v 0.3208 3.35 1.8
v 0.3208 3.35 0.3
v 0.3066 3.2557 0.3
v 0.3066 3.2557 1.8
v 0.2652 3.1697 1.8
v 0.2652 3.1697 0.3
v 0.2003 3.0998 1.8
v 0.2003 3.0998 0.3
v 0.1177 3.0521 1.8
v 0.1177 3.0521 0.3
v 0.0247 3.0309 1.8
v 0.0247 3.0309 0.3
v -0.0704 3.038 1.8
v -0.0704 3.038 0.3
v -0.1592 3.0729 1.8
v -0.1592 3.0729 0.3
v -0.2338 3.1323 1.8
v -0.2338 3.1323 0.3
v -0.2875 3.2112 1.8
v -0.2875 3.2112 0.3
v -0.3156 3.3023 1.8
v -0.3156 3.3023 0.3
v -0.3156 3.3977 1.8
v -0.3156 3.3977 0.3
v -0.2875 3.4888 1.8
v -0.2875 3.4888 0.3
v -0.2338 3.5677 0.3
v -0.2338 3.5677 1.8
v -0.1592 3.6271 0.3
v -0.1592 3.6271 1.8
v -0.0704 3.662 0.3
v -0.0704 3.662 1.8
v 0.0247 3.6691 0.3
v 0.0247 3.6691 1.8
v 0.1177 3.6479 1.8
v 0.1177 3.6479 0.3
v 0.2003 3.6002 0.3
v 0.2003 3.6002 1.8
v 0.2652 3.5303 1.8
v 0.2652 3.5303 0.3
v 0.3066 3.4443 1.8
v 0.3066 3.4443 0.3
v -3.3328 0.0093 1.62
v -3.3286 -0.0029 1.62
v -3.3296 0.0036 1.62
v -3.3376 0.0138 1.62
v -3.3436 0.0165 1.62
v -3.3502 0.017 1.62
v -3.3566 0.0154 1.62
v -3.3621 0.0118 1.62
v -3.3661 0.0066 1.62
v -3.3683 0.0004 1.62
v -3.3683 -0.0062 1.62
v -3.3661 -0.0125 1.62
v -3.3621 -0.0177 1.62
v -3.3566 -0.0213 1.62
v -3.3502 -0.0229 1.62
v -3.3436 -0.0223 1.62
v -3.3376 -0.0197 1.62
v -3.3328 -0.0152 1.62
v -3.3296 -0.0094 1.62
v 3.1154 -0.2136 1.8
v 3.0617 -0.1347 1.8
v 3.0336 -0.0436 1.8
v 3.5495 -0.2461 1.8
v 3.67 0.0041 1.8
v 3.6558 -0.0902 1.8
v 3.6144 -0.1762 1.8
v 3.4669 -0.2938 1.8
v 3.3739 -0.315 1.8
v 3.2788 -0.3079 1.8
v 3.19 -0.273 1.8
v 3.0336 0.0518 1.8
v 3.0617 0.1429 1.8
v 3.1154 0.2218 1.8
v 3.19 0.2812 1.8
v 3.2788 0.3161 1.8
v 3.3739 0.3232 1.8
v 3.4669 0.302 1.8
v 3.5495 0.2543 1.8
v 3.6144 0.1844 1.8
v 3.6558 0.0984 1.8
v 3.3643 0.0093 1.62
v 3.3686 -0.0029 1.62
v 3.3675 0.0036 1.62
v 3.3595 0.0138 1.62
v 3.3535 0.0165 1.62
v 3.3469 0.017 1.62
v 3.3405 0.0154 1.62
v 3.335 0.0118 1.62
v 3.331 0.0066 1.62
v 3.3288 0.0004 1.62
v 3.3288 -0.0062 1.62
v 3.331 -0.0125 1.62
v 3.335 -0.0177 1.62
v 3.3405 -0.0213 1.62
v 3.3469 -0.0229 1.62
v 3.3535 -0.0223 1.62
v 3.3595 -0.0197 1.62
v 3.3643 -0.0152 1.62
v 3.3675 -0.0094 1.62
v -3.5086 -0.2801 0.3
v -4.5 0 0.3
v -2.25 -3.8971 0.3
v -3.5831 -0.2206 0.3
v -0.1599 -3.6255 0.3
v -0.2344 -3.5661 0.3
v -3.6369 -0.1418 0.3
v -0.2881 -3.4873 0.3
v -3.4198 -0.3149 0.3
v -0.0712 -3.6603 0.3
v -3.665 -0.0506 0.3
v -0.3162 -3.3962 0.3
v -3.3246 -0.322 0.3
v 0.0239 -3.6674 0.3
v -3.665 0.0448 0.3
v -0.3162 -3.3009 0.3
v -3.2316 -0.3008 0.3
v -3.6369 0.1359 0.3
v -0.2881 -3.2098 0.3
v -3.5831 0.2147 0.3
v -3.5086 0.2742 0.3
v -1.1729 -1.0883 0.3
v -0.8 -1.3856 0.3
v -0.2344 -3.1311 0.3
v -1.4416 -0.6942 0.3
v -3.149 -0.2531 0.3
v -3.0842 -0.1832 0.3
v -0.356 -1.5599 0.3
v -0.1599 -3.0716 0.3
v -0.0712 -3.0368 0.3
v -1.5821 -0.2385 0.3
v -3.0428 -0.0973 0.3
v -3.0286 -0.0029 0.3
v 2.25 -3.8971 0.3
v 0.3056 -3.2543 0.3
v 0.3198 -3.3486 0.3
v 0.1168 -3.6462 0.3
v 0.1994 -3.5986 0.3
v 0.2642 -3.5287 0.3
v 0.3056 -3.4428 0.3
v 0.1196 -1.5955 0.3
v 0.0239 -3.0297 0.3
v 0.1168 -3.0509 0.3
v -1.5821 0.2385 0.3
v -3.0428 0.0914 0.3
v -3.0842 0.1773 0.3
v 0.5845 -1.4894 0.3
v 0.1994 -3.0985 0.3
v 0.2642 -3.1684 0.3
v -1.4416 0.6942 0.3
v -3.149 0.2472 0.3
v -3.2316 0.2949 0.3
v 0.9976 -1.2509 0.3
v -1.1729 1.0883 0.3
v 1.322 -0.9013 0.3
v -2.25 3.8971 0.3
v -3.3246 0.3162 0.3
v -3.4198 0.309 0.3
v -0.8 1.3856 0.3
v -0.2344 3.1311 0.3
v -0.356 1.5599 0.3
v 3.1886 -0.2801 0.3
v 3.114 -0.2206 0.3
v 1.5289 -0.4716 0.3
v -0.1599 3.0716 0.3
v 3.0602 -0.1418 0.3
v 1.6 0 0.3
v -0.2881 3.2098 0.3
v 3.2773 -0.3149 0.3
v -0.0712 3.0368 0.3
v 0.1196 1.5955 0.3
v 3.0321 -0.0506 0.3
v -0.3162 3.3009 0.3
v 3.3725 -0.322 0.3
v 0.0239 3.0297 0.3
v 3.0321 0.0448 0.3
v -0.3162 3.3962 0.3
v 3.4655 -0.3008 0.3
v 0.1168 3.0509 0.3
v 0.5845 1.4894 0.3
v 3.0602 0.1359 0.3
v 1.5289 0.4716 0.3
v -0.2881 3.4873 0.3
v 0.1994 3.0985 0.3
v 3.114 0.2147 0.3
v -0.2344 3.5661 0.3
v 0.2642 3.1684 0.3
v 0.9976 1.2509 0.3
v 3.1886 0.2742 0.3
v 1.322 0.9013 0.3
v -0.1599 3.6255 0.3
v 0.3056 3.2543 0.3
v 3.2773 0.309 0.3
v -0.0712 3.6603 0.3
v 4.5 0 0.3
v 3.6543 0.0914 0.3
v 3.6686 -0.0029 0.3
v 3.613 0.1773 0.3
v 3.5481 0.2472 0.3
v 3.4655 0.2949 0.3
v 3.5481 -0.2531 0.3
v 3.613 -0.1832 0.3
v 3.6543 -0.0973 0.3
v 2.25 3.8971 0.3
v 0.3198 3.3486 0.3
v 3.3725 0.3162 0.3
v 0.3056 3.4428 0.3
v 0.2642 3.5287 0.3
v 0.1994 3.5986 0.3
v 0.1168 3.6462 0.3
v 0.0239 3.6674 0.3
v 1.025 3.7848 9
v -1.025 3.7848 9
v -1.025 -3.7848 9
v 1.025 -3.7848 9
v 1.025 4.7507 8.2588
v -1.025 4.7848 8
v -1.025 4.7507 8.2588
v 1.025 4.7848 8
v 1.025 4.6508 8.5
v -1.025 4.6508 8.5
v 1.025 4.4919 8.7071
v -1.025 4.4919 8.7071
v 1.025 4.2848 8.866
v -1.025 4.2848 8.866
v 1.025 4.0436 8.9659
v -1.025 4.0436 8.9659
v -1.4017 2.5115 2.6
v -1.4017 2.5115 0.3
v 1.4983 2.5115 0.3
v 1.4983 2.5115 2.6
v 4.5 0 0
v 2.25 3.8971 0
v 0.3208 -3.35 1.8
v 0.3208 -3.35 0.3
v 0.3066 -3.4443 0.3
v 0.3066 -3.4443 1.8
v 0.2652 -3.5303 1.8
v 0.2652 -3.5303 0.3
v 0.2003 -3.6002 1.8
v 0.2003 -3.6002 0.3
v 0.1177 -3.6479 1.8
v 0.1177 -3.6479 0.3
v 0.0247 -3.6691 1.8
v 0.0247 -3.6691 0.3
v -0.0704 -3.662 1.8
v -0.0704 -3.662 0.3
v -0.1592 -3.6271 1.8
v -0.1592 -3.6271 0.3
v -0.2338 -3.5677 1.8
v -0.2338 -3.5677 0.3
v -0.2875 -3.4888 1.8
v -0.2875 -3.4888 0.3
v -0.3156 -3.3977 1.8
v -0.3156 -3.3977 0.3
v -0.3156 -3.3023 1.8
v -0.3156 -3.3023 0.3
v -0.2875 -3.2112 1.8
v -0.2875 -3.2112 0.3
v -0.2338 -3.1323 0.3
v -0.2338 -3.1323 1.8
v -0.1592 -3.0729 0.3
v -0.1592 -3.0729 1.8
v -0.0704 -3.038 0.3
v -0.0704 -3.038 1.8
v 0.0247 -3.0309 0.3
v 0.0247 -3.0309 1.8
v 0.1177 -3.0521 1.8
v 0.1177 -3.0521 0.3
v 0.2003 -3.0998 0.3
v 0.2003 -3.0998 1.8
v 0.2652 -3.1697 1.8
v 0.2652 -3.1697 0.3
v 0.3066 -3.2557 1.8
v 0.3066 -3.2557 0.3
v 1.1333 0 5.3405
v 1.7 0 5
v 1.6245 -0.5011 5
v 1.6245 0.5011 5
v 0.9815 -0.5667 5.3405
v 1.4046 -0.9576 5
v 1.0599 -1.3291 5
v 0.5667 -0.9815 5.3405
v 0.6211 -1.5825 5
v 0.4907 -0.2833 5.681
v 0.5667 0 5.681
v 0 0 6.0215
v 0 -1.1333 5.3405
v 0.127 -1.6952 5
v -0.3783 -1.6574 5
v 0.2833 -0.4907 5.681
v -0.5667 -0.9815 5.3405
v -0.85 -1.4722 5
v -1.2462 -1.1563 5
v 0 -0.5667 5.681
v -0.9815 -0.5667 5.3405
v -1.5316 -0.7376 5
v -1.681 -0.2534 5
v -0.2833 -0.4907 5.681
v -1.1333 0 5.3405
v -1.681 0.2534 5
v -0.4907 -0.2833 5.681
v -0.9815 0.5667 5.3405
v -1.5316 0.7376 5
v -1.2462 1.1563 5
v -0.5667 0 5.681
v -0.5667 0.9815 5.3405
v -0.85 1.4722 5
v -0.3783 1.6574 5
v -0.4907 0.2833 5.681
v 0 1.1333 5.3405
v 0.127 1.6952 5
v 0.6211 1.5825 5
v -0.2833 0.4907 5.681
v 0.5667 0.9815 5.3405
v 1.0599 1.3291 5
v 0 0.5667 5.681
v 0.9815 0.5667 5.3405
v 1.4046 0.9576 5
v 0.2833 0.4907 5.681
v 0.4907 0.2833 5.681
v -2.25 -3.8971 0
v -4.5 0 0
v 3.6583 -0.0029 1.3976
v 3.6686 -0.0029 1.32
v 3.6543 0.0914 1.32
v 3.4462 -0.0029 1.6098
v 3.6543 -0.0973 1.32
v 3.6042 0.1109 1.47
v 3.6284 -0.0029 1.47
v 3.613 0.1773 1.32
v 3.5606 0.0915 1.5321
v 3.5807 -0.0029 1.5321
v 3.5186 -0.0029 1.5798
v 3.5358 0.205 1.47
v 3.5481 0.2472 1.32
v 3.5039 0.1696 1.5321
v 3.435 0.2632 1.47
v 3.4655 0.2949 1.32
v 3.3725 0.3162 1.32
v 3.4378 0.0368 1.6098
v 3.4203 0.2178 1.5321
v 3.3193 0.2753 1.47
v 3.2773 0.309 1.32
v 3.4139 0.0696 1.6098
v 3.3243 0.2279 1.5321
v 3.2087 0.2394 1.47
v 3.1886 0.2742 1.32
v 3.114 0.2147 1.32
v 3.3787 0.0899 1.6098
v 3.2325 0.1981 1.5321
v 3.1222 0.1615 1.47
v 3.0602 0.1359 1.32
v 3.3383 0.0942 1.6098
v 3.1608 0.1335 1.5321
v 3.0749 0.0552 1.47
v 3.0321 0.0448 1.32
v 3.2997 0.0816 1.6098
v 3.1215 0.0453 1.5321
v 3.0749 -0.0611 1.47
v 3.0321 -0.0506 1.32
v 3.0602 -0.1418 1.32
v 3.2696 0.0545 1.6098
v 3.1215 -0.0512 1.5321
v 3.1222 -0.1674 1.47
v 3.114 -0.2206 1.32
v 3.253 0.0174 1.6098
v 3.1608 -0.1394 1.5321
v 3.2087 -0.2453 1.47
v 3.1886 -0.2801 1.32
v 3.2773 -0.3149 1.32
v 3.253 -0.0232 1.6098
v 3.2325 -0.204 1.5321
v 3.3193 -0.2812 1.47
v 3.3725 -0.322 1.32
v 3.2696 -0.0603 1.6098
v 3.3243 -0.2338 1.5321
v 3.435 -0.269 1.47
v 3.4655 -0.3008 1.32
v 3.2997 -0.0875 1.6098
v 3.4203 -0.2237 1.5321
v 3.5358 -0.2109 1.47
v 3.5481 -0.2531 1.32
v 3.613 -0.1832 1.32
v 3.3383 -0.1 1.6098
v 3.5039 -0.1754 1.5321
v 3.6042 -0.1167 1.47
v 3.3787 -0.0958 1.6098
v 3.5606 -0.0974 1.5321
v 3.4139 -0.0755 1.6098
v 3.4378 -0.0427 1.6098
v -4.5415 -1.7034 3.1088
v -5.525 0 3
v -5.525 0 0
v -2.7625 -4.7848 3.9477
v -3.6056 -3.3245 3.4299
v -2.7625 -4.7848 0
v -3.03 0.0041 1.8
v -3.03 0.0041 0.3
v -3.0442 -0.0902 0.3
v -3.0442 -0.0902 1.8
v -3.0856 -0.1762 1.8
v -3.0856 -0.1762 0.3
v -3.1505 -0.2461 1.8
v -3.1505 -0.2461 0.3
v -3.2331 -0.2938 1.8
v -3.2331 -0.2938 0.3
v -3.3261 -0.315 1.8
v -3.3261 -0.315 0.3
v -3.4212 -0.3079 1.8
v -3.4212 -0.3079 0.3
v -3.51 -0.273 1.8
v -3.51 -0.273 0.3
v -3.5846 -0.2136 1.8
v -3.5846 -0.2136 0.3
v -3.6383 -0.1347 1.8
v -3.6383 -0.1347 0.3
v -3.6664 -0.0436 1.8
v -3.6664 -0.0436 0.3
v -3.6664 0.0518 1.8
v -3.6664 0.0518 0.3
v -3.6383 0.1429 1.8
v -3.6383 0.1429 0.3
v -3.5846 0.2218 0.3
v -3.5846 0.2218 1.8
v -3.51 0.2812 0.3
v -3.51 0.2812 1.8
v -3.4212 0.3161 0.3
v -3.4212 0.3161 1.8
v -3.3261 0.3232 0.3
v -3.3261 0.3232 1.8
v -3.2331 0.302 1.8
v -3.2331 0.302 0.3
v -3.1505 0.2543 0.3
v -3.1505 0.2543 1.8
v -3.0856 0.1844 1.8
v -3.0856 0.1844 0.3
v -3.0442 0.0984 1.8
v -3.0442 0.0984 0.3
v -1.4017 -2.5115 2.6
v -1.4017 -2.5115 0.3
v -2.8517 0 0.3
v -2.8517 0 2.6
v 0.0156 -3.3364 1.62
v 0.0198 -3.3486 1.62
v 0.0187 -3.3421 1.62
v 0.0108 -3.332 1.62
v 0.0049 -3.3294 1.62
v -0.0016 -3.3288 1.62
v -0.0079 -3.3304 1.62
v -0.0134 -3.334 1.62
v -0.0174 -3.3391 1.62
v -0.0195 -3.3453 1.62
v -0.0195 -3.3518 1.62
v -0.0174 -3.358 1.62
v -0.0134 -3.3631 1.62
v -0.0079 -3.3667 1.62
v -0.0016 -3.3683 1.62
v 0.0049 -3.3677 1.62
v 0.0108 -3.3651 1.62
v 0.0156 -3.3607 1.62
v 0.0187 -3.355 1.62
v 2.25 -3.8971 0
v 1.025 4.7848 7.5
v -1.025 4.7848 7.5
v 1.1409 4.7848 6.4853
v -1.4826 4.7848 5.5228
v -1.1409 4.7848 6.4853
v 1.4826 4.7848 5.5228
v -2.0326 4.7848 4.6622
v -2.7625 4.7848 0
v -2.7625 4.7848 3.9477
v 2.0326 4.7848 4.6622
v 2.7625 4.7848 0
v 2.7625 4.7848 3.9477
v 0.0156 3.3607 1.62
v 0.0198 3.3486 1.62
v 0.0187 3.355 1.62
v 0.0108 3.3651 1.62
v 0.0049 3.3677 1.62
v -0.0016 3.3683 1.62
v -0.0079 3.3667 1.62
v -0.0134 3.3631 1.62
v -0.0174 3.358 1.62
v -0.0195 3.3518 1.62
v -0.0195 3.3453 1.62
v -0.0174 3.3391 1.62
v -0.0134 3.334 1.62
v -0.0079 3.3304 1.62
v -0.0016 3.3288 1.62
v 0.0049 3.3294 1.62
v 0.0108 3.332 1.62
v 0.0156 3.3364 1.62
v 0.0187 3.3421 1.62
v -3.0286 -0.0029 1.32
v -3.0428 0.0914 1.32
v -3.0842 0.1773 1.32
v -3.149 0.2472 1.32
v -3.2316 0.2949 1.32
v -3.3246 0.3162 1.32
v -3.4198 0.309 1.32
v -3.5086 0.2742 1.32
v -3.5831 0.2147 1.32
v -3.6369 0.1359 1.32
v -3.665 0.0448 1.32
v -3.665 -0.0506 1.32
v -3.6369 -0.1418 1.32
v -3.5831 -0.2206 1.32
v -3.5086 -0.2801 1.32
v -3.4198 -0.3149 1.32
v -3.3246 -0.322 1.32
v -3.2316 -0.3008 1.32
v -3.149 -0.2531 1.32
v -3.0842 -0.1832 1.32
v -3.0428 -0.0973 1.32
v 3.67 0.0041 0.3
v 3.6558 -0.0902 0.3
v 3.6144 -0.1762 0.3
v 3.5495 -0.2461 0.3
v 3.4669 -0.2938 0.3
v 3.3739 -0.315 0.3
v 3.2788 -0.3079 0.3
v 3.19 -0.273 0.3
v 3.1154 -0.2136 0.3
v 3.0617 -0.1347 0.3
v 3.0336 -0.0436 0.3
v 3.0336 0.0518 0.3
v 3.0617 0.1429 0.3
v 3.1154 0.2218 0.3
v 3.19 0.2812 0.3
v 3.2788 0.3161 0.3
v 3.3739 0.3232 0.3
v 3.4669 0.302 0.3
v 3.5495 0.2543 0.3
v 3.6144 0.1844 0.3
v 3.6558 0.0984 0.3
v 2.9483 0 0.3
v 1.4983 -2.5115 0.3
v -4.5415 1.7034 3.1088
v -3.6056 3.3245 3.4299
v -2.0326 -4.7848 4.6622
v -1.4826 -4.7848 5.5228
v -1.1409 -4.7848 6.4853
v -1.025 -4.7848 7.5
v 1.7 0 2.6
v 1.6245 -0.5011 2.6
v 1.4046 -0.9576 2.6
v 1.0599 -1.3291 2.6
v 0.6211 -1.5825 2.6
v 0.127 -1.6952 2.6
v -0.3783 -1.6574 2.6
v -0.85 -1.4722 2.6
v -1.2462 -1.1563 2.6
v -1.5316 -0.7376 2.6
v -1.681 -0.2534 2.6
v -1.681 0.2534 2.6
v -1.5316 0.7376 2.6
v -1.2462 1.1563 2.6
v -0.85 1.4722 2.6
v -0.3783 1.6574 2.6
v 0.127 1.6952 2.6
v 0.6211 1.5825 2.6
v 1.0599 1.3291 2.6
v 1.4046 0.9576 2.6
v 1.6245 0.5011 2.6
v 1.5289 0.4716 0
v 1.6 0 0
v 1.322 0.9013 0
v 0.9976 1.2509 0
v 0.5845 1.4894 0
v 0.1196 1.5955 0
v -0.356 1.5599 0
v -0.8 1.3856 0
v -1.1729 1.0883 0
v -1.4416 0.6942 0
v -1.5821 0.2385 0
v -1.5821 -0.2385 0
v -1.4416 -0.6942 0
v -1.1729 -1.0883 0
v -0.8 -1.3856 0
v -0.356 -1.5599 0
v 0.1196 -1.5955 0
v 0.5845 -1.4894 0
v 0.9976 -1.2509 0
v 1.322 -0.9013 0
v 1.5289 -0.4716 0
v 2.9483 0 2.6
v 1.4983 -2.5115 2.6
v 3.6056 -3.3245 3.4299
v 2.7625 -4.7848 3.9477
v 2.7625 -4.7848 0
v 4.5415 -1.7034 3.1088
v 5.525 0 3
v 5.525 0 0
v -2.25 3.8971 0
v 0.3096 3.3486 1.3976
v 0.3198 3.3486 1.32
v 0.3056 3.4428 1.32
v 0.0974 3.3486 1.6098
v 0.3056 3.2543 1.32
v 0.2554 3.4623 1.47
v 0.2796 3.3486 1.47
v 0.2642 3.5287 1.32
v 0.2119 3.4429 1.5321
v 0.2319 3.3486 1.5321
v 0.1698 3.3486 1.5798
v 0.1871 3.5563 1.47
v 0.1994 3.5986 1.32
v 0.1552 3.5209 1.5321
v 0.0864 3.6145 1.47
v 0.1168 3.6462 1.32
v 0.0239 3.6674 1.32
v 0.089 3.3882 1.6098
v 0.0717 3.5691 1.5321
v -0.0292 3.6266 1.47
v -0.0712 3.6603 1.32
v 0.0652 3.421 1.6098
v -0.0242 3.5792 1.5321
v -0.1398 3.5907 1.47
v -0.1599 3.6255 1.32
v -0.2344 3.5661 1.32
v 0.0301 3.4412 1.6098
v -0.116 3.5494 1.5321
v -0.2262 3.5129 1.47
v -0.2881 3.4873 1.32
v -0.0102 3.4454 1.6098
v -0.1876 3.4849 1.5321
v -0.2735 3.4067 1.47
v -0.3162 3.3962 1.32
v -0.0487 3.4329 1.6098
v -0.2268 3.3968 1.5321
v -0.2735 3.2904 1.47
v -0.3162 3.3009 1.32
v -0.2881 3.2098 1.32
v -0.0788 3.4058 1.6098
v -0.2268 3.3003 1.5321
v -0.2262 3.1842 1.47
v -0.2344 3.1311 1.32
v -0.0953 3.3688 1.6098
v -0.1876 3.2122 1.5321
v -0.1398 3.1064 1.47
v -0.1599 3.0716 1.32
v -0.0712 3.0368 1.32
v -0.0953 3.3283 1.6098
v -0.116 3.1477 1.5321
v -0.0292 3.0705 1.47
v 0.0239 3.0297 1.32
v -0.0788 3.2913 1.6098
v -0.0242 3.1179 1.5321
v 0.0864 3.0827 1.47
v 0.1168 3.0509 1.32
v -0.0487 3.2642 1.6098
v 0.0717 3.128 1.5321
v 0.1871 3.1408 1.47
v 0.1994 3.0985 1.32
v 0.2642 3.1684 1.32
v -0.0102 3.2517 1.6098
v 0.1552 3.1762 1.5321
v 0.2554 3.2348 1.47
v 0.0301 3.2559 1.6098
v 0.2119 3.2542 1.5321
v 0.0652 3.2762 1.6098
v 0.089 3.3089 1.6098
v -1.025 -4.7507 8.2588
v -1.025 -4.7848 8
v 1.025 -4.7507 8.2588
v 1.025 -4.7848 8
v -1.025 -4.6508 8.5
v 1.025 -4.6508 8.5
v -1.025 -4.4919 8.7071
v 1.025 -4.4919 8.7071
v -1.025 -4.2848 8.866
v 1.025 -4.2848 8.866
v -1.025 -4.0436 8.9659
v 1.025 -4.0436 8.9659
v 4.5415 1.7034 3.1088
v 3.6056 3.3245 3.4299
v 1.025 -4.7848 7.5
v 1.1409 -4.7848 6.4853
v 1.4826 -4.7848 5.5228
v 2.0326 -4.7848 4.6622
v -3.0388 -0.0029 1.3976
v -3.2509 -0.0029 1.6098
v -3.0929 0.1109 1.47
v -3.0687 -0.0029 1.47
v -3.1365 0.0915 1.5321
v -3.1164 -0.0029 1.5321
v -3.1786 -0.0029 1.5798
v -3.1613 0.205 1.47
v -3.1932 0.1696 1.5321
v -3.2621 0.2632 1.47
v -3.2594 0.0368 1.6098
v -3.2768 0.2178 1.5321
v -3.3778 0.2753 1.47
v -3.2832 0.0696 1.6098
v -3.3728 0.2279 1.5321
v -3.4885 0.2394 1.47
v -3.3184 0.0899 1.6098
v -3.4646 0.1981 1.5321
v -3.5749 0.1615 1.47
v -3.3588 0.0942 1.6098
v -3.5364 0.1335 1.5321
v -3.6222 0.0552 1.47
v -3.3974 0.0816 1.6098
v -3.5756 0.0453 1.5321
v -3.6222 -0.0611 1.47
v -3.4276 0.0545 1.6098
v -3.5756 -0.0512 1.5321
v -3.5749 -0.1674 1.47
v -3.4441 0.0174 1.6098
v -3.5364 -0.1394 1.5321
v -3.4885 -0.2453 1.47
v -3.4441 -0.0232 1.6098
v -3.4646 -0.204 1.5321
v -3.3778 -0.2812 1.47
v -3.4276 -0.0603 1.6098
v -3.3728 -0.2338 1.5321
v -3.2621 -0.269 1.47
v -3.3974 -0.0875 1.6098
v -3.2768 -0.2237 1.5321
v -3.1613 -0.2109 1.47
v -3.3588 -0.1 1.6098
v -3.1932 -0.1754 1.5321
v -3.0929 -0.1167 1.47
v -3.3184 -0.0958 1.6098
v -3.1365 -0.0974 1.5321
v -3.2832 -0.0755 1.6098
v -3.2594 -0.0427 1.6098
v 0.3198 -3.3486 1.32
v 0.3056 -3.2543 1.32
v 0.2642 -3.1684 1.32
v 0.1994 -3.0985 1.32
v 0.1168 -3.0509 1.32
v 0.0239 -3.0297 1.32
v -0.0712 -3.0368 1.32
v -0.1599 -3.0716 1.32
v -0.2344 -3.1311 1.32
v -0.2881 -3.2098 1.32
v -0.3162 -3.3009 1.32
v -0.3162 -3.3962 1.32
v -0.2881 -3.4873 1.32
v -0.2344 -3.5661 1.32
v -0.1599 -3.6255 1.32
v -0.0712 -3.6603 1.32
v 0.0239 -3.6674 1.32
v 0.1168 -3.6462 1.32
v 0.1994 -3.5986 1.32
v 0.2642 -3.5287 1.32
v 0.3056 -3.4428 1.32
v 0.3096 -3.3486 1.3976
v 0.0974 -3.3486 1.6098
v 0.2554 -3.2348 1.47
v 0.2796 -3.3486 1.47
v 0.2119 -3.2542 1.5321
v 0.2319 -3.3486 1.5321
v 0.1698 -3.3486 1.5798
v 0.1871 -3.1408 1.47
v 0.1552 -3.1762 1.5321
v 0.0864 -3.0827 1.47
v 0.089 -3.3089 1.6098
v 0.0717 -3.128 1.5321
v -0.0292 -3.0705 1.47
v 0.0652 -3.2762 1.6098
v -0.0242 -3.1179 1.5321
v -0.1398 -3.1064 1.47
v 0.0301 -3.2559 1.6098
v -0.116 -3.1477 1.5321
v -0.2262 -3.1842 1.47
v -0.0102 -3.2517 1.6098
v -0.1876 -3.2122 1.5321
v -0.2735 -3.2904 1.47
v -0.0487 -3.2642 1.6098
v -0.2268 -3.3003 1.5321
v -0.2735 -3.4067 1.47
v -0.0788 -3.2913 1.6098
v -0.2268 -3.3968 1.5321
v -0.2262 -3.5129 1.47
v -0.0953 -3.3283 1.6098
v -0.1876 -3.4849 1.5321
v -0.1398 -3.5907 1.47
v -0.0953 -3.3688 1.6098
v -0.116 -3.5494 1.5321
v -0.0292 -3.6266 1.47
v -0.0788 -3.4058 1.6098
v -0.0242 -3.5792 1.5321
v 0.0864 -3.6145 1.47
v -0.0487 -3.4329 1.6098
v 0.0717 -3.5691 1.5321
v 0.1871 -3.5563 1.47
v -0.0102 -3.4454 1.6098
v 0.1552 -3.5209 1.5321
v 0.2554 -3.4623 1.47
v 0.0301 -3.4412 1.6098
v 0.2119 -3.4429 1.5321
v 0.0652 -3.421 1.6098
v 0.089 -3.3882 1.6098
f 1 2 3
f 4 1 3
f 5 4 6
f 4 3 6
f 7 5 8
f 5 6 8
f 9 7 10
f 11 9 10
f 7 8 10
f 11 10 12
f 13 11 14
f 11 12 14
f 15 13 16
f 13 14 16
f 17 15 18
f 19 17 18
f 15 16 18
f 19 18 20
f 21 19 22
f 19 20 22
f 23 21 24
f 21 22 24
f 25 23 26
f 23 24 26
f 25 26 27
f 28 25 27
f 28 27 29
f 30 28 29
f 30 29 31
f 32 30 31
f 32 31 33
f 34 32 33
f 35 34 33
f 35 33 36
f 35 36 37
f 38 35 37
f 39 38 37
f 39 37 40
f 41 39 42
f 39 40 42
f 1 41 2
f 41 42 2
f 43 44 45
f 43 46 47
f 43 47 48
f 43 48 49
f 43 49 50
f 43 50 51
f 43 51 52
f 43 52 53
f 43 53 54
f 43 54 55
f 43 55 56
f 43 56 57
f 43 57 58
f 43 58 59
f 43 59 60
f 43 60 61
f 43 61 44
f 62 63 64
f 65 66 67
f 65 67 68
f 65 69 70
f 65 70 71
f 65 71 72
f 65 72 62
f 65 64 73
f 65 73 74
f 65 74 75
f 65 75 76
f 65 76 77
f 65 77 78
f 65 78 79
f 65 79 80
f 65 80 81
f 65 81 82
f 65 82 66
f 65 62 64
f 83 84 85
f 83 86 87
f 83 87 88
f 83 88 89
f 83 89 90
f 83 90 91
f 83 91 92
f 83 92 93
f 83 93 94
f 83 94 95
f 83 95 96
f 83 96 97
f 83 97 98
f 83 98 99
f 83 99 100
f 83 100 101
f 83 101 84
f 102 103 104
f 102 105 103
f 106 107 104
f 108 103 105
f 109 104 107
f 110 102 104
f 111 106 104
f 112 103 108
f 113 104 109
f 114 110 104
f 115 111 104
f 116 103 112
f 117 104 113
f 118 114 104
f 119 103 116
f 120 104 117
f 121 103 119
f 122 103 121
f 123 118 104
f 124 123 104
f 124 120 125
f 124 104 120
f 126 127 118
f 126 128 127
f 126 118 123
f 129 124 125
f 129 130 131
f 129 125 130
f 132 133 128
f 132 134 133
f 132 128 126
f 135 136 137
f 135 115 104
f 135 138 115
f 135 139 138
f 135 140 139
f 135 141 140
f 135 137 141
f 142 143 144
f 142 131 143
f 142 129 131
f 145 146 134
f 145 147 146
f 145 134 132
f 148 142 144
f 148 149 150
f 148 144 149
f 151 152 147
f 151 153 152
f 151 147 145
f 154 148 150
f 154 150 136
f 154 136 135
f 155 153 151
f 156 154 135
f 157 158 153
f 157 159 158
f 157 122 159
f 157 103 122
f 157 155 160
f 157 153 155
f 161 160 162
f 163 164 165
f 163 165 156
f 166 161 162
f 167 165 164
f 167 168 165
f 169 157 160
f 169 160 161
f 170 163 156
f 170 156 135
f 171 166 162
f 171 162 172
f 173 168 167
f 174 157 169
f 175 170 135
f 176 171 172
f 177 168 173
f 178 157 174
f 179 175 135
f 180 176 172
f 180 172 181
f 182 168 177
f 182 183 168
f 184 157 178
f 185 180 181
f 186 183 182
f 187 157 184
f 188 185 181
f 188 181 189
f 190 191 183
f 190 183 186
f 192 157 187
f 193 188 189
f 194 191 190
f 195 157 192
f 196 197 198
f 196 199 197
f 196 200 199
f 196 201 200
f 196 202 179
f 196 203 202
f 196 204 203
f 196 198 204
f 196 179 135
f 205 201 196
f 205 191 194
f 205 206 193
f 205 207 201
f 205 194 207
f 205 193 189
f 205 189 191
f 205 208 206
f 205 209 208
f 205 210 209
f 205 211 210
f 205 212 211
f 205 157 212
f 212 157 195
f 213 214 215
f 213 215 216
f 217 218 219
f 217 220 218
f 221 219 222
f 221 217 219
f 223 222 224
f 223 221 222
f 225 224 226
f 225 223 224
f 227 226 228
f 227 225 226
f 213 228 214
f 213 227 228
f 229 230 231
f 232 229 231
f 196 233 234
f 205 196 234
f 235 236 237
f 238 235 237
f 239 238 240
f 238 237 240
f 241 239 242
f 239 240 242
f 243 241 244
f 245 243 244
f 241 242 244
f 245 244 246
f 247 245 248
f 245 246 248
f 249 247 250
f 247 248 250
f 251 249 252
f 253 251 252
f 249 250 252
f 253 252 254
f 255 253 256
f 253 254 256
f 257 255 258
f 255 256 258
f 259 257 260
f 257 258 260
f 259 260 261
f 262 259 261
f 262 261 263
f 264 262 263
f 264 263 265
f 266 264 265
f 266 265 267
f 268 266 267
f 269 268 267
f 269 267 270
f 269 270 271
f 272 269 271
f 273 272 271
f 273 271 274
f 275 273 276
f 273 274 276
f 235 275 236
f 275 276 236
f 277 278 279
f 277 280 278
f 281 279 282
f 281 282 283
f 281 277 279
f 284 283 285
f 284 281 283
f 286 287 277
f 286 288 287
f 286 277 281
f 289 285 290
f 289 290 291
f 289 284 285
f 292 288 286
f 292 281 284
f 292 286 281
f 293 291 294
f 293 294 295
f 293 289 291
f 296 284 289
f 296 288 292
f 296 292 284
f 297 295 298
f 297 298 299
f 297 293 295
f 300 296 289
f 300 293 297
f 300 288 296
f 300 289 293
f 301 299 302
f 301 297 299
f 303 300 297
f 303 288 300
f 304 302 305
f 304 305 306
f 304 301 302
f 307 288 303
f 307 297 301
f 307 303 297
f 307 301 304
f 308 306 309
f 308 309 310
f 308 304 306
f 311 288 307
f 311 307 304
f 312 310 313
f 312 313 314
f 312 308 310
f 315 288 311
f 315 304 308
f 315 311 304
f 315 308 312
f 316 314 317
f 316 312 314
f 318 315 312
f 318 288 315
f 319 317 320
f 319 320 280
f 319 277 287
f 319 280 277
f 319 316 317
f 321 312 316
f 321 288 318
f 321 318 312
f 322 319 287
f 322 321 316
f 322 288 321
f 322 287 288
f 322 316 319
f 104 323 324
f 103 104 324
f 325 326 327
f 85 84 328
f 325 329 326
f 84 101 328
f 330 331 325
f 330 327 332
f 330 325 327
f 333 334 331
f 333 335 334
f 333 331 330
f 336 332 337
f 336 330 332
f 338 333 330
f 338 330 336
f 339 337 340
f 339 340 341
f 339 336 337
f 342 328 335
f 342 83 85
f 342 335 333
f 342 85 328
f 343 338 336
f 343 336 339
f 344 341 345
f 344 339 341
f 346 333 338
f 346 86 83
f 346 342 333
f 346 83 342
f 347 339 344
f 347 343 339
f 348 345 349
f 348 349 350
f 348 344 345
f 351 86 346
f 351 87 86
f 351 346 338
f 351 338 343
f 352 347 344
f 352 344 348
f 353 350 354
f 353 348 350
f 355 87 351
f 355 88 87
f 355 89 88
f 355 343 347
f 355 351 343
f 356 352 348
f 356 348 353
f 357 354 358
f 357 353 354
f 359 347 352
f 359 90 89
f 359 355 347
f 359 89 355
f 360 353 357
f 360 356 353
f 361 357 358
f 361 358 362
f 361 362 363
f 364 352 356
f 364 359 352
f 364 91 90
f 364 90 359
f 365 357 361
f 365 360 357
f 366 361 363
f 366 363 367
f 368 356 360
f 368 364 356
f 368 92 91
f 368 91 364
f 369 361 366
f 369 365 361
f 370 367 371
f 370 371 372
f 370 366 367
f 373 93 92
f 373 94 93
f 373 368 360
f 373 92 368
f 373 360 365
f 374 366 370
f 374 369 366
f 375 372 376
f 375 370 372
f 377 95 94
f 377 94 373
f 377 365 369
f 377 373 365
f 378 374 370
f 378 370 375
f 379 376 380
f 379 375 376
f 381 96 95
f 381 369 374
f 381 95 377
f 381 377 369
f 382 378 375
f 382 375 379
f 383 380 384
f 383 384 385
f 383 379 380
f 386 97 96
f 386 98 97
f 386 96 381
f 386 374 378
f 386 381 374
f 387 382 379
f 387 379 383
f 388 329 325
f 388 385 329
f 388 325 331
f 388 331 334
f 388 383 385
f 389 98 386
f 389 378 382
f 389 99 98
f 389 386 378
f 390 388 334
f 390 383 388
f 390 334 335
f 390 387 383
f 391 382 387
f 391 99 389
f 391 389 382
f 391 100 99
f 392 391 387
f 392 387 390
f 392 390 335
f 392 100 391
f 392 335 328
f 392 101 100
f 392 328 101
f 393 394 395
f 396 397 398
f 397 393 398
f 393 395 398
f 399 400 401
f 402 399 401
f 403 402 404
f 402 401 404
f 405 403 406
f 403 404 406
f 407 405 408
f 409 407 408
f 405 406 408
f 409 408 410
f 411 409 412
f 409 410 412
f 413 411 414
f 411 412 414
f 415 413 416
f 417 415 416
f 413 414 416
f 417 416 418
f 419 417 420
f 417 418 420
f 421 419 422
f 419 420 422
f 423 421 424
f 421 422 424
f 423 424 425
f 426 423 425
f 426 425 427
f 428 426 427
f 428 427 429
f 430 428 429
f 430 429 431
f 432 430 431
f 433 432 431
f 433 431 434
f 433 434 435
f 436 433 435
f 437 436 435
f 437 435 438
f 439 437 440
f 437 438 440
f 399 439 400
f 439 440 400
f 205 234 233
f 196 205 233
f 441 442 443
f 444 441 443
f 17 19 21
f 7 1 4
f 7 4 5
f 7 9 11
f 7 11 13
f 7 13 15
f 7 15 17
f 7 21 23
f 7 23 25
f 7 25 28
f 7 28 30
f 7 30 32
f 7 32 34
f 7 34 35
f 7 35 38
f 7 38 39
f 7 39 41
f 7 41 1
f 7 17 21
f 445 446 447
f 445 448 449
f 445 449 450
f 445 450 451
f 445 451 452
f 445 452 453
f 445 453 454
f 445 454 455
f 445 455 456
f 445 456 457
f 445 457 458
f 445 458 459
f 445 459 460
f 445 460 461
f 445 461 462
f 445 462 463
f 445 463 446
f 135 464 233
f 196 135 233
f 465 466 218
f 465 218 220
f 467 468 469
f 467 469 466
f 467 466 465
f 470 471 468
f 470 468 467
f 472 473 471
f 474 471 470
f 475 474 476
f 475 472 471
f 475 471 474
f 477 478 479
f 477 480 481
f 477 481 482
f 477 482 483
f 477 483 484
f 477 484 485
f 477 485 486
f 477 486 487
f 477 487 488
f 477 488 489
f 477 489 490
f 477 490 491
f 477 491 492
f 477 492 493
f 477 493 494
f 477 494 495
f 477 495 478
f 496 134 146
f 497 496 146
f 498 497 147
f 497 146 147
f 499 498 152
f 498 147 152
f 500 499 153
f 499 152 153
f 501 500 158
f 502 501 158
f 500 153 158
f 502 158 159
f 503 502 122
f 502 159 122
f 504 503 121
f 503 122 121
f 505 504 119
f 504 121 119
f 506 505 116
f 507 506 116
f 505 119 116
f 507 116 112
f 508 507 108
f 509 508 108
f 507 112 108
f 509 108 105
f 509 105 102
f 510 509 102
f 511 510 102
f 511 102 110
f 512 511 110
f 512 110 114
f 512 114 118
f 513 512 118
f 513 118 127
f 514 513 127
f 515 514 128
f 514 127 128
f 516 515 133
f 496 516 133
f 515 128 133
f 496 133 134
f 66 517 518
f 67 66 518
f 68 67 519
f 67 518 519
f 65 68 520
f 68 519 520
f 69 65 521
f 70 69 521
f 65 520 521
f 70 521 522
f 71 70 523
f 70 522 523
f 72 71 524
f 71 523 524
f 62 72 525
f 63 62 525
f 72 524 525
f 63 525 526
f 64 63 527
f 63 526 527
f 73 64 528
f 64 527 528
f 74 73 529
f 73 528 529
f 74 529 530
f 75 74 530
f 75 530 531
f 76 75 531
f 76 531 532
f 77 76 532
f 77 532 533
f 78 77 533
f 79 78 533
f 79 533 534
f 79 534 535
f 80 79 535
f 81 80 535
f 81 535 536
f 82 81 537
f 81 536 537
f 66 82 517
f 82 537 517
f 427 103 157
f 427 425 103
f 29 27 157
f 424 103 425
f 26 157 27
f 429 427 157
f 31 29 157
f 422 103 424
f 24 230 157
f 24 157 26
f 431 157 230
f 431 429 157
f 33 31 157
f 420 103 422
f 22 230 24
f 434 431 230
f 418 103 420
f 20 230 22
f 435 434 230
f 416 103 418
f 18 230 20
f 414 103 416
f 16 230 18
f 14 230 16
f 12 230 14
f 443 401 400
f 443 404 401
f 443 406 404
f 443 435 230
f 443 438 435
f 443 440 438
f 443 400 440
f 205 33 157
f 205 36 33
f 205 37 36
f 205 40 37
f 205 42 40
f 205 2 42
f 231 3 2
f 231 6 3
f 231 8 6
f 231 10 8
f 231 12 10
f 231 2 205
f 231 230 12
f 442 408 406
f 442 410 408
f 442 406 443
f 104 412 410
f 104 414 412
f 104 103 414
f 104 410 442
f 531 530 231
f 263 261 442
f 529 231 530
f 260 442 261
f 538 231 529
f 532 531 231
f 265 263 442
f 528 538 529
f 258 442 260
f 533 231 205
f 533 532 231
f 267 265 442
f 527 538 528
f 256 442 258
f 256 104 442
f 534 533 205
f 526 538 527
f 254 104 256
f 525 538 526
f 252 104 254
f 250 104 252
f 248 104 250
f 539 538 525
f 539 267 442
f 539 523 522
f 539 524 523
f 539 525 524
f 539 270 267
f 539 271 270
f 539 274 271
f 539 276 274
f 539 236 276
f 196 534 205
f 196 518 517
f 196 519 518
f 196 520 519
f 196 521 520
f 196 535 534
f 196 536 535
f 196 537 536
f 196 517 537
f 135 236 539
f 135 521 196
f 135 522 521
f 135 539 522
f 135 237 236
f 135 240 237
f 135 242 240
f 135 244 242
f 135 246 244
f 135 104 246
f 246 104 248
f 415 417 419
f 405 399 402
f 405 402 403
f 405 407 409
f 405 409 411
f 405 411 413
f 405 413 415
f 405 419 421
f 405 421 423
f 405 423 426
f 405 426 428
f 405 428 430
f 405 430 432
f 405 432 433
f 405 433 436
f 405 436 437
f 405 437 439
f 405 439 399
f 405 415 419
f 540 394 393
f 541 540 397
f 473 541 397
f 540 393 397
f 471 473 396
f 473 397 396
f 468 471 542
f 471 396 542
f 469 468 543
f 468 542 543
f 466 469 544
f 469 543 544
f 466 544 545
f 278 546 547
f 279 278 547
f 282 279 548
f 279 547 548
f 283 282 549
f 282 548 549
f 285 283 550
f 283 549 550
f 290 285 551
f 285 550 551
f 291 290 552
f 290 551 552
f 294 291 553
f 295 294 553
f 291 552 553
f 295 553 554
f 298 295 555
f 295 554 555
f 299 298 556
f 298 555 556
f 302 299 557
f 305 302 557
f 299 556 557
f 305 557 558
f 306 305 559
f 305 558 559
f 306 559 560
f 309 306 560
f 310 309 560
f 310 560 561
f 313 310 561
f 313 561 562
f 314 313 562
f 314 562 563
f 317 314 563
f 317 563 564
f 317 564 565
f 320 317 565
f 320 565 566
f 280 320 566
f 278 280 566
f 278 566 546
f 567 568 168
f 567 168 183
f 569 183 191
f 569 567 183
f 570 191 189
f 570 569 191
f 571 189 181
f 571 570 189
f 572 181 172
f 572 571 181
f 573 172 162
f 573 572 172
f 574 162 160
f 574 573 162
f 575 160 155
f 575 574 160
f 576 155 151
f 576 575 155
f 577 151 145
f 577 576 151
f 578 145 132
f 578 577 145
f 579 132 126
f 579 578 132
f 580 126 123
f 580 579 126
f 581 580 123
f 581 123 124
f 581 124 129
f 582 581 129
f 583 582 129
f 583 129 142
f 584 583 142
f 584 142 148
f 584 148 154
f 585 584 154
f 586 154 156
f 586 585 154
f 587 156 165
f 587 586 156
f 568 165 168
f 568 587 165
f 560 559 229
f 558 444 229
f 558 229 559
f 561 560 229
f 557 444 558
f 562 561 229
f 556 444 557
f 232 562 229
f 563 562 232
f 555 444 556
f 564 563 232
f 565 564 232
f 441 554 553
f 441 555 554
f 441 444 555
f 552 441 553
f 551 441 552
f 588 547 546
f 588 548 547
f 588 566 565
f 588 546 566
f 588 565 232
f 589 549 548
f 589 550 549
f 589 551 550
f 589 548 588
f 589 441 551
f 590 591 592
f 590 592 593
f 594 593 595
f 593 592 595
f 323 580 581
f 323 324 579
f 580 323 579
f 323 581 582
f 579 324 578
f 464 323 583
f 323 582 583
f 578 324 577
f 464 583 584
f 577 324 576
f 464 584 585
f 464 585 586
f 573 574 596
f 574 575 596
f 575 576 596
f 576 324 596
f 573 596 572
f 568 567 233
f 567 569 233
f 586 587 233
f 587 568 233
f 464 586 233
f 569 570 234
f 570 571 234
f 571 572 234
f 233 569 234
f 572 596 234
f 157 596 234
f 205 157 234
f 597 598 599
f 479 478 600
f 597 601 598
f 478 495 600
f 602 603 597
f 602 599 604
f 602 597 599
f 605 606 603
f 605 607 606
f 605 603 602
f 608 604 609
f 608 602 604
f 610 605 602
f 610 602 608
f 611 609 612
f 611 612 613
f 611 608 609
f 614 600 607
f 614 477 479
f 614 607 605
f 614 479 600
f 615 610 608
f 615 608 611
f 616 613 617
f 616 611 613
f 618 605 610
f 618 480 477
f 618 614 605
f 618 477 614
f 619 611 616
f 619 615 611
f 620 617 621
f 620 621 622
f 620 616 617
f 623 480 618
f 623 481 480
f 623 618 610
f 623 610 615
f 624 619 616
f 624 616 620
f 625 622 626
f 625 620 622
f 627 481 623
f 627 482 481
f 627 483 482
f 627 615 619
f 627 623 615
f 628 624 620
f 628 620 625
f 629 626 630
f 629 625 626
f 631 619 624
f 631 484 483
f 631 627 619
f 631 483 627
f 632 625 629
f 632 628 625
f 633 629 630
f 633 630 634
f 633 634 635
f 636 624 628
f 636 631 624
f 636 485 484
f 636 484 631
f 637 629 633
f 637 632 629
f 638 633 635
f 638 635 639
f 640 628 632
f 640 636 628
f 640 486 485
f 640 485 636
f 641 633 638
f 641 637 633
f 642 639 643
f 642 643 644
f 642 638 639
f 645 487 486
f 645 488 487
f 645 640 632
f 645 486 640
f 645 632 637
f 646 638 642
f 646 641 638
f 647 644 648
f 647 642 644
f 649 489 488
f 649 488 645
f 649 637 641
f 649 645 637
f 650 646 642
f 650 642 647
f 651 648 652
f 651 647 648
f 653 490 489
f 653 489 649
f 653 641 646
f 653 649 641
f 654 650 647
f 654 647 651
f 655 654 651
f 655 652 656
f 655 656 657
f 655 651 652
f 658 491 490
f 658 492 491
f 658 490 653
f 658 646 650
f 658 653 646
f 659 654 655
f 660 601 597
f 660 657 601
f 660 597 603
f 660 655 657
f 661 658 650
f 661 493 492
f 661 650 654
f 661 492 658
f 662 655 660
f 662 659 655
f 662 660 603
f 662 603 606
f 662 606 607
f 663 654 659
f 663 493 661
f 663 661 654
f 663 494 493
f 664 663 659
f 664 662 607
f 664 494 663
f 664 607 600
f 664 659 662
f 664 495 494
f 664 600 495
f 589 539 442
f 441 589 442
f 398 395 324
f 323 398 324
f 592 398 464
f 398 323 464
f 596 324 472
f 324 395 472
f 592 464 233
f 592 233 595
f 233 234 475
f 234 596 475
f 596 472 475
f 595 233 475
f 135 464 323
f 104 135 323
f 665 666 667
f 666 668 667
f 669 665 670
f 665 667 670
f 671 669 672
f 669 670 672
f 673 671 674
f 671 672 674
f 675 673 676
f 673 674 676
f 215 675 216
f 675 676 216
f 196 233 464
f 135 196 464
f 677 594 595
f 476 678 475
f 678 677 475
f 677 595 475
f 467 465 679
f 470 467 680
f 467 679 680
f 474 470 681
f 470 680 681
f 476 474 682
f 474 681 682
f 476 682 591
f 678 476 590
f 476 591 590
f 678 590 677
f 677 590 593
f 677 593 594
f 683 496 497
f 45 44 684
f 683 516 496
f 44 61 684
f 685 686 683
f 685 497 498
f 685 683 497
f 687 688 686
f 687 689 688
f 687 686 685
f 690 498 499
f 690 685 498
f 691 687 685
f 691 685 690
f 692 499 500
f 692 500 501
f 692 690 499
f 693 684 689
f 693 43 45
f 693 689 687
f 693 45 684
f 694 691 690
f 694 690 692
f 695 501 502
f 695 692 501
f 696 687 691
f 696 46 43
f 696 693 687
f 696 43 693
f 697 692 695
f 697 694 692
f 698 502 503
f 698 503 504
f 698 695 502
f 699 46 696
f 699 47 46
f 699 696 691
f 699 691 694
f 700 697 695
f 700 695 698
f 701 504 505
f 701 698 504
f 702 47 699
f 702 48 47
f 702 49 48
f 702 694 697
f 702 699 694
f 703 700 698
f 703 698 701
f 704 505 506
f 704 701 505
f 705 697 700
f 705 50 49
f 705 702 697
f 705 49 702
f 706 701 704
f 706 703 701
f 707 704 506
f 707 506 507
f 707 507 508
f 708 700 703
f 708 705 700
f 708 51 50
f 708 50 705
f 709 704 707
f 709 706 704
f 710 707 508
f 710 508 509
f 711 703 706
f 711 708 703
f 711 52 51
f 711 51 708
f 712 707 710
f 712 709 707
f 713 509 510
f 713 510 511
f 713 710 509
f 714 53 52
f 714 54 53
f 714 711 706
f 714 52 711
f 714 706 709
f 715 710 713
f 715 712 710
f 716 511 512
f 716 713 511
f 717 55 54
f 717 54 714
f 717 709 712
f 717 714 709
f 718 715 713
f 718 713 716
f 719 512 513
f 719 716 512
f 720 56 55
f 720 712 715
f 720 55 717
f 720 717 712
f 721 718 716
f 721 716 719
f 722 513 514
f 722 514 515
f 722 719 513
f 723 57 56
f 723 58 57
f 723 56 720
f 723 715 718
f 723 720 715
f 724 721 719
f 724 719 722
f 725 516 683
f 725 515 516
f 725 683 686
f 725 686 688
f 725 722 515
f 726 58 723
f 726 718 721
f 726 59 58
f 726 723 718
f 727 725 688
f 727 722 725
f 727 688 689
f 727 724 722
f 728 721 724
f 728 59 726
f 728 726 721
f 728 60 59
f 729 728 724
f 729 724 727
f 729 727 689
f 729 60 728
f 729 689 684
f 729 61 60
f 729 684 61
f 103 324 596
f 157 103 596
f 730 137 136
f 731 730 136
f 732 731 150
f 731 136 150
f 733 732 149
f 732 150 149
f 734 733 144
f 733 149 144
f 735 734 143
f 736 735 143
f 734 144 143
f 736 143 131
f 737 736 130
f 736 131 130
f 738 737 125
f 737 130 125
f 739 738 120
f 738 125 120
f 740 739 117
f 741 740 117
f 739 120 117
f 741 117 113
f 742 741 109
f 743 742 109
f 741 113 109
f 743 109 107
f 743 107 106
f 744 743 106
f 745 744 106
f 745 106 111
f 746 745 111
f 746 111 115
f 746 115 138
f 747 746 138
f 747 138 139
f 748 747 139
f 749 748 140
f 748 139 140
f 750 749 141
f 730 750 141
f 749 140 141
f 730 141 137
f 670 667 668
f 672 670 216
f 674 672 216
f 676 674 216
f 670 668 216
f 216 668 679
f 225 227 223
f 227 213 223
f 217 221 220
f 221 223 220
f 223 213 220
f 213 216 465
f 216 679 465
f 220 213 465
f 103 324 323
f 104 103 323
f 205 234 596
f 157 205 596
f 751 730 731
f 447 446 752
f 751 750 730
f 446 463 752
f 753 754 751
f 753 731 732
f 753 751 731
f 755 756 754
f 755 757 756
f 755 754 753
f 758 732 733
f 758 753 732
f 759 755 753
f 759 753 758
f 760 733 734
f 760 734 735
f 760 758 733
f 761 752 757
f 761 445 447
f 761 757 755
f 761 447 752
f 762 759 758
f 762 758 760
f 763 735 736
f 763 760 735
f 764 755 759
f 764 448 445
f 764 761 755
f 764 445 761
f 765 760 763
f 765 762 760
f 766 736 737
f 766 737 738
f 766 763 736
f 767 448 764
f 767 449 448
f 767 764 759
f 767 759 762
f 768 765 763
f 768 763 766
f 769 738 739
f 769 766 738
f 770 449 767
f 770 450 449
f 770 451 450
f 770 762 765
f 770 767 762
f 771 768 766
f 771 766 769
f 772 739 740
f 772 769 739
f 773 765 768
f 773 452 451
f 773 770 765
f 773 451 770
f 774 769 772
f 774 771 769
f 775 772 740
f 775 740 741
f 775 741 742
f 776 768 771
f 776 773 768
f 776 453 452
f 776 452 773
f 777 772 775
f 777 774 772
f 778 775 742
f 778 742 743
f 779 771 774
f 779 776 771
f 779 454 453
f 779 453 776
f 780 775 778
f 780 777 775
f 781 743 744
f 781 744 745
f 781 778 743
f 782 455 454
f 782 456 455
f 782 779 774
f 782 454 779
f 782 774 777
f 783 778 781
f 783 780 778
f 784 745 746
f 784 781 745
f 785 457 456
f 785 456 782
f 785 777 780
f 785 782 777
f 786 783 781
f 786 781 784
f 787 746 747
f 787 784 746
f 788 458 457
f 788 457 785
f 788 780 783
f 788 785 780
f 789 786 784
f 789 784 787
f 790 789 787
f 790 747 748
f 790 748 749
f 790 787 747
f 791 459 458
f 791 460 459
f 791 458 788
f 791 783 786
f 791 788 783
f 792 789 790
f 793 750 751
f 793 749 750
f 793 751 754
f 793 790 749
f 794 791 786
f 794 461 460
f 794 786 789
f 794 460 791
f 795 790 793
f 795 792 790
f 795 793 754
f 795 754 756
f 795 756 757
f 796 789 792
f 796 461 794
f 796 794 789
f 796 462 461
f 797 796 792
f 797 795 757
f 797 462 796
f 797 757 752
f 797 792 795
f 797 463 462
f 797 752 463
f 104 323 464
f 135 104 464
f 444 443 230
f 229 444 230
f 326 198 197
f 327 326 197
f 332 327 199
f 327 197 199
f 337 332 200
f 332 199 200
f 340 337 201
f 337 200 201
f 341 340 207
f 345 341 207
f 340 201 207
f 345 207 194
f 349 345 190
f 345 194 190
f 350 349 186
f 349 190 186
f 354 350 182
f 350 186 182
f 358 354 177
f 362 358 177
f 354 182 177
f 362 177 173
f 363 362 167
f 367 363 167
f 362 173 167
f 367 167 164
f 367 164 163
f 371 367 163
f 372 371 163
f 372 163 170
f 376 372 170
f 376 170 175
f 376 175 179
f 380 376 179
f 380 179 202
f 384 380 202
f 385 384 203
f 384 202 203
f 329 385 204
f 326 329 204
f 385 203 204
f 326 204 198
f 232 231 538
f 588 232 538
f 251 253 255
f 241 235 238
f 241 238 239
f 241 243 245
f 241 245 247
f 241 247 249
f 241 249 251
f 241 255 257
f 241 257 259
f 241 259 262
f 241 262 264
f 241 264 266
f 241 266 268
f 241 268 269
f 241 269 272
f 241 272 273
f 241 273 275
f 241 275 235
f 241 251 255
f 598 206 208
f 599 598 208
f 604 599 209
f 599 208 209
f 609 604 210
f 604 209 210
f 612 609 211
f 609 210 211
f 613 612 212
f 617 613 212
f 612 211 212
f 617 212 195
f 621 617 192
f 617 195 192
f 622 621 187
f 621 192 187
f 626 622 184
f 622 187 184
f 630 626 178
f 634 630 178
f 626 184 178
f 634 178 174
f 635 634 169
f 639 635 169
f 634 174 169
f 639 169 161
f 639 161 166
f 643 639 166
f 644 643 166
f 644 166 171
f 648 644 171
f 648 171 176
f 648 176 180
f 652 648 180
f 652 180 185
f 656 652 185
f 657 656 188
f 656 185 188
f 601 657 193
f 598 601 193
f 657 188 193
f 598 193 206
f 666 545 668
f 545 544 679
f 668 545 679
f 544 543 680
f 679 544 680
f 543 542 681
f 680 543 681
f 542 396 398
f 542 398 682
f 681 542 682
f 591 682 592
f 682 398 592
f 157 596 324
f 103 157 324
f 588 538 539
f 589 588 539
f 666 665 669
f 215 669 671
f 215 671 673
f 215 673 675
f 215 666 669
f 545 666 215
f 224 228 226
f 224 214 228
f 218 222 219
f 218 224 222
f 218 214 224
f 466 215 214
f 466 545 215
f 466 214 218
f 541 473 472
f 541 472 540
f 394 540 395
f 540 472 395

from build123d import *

# Parameters (mm, degrees)
PAD_DEPTH       = 7.5
SKETCH001_R     = 4.5
POCKET_DEPTH    = 30
SKETCH002_R     = 1.7
HOLE_DEPTH      = 5
HOLE_TIPS_R     = 1.7
POCKET001_DEPTH = 2.6
POCKET002_DEPTH = 0.3
SKETCH007_R     = 0.32
POCKET003_DEPTH = 1.5
SKETCH008_W     = 2.05
SKETCH008_H     = 9.56958
PAD003_DEPTH    = 1.5
FILLET001_R     = 1
SKETCH005_R     = 1.6
PAD001_DEPTH    = 0.3
SKETCH006_R     = 0.32
SKETCH006_R_2   = 0.319777
PAD002_DEPTH    = 1.32
FILLET_R        = 0.3


with BuildPart() as main_body:
    # Sketch → Pad (new body)
    with BuildSketch(Plane.XY):
        Polygon((5.525, 0), (2.7625, 4.78479), (-2.7625, 4.78479), (-5.525, 0), (-2.7625, -4.78479), (2.7625, -4.78479), align=None)
    extrude(amount=PAD_DEPTH)

    # Sketch001 (on Face5 of Pad) → Pocket (cut)
    with BuildSketch(Plane.XZ.offset(4.78479)):
        with Locations((-5.525, 7.5)):
            Circle(SKETCH001_R)
        with Locations((5.525, 7.5)):
            Circle(SKETCH001_R)
    extrude(amount=-POCKET_DEPTH, mode=Mode.SUBTRACT)

    # Sketch002 → Hole (cut)
    with BuildSketch(Plane(origin=(0, 0, 0), x_dir=(1, 0, 0), z_dir=(0, 0, -1))):
        Circle(SKETCH002_R)
    extrude(amount=-HOLE_DEPTH, mode=Mode.SUBTRACT)

    # Hole tips → Hole tip 1 section 0
    with BuildSketch(Plane(origin=(0, 0, 5), x_dir=(1, 0, 0), z_dir=(0, 0, -1)), mode=Mode.PRIVATE) as hole_tip_1_s0:
        Circle(HOLE_TIPS_R)
    loft([hole_tip_1_s0.sketch, Vertex(0, 0, 6.021463)], mode=Mode.SUBTRACT)

    # Sketch003 (on Face2 of Hole) → Pocket001 (cut)
    with BuildSketch(Plane(origin=(0, 0, 0), x_dir=(1, 0, 0), z_dir=(0, 0, -1))):
        Polygon((2.948341, 0), (1.498341, 2.511474), (-1.401659, 2.511474), (-2.851659, 0), (-1.401659, -2.511474), (1.498341, -2.511474), align=None)
    extrude(amount=-POCKET001_DEPTH, mode=Mode.SUBTRACT)

    # Sketch004 (on Face2 of Pocket001) → Pocket002 (cut)
    with BuildSketch(Plane(origin=(0, 0, 0), x_dir=(1, 0, 0), z_dir=(0, 0, -1))):
        Polygon((4.5, 0), (2.25, 3.897114), (-2.25, 3.897114), (-4.5, 0), (-2.25, -3.897114), (2.25, -3.897114), align=None)
    extrude(amount=-POCKET002_DEPTH, mode=Mode.SUBTRACT)

    # Sketch007 (on Face17 of Pocket002) → Pocket003 (cut)
    with BuildSketch(Plane(origin=(0, 0, 0.3), x_dir=(1, 0, 0), z_dir=(0, 0, -1))):
        with Locations((0.000817, -3.35)):
            Circle(SKETCH007_R)
        with Locations((-3.349997, -0.004097)):
            Circle(SKETCH007_R)
        with Locations((0.000817, 3.35)):
            Circle(SKETCH007_R)
        with Locations((3.349997, -0.004097)):
            Circle(SKETCH007_R)
    extrude(amount=-POCKET003_DEPTH, mode=Mode.SUBTRACT)

    # Sketch008 (on Face16 of Pocket003) → Pad003 (join)
    with BuildSketch(Plane.XY.offset(7.5)):
        Rectangle(SKETCH008_W, SKETCH008_H)
    extrude(amount=PAD003_DEPTH)

    # Fillet001
    fillet001_edges = [main_body.edges().sort_by_distance(p)[0] for p in [
        (0, -4.78479, 9),
        (0, 4.78479, 9),
    ]]
    fillet(fillet001_edges, radius=FILLET001_R)


with BuildPart() as cap_body:
    # Sketch005 → Pad001 (new body)
    with BuildSketch(Plane.XY):
        Polygon((4.5, 0), (2.25, 3.897114), (-2.25, 3.897114), (-4.5, 0), (-2.25, -3.897114), (2.25, -3.897114), align=None)
        Circle(SKETCH005_R, mode=Mode.SUBTRACT)
    extrude(amount=PAD001_DEPTH)

    # Sketch006 (on Face9 of Pad001) → Pad002 (join)
    with BuildSketch(Plane.XY.offset(0.3)):
        with Locations((-3.348556, -0.002937)):
            Circle(SKETCH006_R)
        with Locations((0, -3.348557)):
            Circle(SKETCH006_R_2)
        with Locations((0, 3.348557)):
            Circle(SKETCH006_R_2)
        with Locations((3.348556, -0.002937)):
            Circle(SKETCH006_R)
    extrude(amount=PAD002_DEPTH)

    # Fillet
    fillet_edges = [cap_body.edges().sort_by_distance(p)[0] for p in [
        (-0.319777, -3.348557, 1.62),
        (-3.668556, -0.002937, 1.62),
        (-0.319777, 3.348557, 1.62),
        (3.028556, -0.002937, 1.62),
    ]]
    fillet(fillet_edges, radius=FILLET_R)


solid = Compound([main_body.part, cap_body.part])
